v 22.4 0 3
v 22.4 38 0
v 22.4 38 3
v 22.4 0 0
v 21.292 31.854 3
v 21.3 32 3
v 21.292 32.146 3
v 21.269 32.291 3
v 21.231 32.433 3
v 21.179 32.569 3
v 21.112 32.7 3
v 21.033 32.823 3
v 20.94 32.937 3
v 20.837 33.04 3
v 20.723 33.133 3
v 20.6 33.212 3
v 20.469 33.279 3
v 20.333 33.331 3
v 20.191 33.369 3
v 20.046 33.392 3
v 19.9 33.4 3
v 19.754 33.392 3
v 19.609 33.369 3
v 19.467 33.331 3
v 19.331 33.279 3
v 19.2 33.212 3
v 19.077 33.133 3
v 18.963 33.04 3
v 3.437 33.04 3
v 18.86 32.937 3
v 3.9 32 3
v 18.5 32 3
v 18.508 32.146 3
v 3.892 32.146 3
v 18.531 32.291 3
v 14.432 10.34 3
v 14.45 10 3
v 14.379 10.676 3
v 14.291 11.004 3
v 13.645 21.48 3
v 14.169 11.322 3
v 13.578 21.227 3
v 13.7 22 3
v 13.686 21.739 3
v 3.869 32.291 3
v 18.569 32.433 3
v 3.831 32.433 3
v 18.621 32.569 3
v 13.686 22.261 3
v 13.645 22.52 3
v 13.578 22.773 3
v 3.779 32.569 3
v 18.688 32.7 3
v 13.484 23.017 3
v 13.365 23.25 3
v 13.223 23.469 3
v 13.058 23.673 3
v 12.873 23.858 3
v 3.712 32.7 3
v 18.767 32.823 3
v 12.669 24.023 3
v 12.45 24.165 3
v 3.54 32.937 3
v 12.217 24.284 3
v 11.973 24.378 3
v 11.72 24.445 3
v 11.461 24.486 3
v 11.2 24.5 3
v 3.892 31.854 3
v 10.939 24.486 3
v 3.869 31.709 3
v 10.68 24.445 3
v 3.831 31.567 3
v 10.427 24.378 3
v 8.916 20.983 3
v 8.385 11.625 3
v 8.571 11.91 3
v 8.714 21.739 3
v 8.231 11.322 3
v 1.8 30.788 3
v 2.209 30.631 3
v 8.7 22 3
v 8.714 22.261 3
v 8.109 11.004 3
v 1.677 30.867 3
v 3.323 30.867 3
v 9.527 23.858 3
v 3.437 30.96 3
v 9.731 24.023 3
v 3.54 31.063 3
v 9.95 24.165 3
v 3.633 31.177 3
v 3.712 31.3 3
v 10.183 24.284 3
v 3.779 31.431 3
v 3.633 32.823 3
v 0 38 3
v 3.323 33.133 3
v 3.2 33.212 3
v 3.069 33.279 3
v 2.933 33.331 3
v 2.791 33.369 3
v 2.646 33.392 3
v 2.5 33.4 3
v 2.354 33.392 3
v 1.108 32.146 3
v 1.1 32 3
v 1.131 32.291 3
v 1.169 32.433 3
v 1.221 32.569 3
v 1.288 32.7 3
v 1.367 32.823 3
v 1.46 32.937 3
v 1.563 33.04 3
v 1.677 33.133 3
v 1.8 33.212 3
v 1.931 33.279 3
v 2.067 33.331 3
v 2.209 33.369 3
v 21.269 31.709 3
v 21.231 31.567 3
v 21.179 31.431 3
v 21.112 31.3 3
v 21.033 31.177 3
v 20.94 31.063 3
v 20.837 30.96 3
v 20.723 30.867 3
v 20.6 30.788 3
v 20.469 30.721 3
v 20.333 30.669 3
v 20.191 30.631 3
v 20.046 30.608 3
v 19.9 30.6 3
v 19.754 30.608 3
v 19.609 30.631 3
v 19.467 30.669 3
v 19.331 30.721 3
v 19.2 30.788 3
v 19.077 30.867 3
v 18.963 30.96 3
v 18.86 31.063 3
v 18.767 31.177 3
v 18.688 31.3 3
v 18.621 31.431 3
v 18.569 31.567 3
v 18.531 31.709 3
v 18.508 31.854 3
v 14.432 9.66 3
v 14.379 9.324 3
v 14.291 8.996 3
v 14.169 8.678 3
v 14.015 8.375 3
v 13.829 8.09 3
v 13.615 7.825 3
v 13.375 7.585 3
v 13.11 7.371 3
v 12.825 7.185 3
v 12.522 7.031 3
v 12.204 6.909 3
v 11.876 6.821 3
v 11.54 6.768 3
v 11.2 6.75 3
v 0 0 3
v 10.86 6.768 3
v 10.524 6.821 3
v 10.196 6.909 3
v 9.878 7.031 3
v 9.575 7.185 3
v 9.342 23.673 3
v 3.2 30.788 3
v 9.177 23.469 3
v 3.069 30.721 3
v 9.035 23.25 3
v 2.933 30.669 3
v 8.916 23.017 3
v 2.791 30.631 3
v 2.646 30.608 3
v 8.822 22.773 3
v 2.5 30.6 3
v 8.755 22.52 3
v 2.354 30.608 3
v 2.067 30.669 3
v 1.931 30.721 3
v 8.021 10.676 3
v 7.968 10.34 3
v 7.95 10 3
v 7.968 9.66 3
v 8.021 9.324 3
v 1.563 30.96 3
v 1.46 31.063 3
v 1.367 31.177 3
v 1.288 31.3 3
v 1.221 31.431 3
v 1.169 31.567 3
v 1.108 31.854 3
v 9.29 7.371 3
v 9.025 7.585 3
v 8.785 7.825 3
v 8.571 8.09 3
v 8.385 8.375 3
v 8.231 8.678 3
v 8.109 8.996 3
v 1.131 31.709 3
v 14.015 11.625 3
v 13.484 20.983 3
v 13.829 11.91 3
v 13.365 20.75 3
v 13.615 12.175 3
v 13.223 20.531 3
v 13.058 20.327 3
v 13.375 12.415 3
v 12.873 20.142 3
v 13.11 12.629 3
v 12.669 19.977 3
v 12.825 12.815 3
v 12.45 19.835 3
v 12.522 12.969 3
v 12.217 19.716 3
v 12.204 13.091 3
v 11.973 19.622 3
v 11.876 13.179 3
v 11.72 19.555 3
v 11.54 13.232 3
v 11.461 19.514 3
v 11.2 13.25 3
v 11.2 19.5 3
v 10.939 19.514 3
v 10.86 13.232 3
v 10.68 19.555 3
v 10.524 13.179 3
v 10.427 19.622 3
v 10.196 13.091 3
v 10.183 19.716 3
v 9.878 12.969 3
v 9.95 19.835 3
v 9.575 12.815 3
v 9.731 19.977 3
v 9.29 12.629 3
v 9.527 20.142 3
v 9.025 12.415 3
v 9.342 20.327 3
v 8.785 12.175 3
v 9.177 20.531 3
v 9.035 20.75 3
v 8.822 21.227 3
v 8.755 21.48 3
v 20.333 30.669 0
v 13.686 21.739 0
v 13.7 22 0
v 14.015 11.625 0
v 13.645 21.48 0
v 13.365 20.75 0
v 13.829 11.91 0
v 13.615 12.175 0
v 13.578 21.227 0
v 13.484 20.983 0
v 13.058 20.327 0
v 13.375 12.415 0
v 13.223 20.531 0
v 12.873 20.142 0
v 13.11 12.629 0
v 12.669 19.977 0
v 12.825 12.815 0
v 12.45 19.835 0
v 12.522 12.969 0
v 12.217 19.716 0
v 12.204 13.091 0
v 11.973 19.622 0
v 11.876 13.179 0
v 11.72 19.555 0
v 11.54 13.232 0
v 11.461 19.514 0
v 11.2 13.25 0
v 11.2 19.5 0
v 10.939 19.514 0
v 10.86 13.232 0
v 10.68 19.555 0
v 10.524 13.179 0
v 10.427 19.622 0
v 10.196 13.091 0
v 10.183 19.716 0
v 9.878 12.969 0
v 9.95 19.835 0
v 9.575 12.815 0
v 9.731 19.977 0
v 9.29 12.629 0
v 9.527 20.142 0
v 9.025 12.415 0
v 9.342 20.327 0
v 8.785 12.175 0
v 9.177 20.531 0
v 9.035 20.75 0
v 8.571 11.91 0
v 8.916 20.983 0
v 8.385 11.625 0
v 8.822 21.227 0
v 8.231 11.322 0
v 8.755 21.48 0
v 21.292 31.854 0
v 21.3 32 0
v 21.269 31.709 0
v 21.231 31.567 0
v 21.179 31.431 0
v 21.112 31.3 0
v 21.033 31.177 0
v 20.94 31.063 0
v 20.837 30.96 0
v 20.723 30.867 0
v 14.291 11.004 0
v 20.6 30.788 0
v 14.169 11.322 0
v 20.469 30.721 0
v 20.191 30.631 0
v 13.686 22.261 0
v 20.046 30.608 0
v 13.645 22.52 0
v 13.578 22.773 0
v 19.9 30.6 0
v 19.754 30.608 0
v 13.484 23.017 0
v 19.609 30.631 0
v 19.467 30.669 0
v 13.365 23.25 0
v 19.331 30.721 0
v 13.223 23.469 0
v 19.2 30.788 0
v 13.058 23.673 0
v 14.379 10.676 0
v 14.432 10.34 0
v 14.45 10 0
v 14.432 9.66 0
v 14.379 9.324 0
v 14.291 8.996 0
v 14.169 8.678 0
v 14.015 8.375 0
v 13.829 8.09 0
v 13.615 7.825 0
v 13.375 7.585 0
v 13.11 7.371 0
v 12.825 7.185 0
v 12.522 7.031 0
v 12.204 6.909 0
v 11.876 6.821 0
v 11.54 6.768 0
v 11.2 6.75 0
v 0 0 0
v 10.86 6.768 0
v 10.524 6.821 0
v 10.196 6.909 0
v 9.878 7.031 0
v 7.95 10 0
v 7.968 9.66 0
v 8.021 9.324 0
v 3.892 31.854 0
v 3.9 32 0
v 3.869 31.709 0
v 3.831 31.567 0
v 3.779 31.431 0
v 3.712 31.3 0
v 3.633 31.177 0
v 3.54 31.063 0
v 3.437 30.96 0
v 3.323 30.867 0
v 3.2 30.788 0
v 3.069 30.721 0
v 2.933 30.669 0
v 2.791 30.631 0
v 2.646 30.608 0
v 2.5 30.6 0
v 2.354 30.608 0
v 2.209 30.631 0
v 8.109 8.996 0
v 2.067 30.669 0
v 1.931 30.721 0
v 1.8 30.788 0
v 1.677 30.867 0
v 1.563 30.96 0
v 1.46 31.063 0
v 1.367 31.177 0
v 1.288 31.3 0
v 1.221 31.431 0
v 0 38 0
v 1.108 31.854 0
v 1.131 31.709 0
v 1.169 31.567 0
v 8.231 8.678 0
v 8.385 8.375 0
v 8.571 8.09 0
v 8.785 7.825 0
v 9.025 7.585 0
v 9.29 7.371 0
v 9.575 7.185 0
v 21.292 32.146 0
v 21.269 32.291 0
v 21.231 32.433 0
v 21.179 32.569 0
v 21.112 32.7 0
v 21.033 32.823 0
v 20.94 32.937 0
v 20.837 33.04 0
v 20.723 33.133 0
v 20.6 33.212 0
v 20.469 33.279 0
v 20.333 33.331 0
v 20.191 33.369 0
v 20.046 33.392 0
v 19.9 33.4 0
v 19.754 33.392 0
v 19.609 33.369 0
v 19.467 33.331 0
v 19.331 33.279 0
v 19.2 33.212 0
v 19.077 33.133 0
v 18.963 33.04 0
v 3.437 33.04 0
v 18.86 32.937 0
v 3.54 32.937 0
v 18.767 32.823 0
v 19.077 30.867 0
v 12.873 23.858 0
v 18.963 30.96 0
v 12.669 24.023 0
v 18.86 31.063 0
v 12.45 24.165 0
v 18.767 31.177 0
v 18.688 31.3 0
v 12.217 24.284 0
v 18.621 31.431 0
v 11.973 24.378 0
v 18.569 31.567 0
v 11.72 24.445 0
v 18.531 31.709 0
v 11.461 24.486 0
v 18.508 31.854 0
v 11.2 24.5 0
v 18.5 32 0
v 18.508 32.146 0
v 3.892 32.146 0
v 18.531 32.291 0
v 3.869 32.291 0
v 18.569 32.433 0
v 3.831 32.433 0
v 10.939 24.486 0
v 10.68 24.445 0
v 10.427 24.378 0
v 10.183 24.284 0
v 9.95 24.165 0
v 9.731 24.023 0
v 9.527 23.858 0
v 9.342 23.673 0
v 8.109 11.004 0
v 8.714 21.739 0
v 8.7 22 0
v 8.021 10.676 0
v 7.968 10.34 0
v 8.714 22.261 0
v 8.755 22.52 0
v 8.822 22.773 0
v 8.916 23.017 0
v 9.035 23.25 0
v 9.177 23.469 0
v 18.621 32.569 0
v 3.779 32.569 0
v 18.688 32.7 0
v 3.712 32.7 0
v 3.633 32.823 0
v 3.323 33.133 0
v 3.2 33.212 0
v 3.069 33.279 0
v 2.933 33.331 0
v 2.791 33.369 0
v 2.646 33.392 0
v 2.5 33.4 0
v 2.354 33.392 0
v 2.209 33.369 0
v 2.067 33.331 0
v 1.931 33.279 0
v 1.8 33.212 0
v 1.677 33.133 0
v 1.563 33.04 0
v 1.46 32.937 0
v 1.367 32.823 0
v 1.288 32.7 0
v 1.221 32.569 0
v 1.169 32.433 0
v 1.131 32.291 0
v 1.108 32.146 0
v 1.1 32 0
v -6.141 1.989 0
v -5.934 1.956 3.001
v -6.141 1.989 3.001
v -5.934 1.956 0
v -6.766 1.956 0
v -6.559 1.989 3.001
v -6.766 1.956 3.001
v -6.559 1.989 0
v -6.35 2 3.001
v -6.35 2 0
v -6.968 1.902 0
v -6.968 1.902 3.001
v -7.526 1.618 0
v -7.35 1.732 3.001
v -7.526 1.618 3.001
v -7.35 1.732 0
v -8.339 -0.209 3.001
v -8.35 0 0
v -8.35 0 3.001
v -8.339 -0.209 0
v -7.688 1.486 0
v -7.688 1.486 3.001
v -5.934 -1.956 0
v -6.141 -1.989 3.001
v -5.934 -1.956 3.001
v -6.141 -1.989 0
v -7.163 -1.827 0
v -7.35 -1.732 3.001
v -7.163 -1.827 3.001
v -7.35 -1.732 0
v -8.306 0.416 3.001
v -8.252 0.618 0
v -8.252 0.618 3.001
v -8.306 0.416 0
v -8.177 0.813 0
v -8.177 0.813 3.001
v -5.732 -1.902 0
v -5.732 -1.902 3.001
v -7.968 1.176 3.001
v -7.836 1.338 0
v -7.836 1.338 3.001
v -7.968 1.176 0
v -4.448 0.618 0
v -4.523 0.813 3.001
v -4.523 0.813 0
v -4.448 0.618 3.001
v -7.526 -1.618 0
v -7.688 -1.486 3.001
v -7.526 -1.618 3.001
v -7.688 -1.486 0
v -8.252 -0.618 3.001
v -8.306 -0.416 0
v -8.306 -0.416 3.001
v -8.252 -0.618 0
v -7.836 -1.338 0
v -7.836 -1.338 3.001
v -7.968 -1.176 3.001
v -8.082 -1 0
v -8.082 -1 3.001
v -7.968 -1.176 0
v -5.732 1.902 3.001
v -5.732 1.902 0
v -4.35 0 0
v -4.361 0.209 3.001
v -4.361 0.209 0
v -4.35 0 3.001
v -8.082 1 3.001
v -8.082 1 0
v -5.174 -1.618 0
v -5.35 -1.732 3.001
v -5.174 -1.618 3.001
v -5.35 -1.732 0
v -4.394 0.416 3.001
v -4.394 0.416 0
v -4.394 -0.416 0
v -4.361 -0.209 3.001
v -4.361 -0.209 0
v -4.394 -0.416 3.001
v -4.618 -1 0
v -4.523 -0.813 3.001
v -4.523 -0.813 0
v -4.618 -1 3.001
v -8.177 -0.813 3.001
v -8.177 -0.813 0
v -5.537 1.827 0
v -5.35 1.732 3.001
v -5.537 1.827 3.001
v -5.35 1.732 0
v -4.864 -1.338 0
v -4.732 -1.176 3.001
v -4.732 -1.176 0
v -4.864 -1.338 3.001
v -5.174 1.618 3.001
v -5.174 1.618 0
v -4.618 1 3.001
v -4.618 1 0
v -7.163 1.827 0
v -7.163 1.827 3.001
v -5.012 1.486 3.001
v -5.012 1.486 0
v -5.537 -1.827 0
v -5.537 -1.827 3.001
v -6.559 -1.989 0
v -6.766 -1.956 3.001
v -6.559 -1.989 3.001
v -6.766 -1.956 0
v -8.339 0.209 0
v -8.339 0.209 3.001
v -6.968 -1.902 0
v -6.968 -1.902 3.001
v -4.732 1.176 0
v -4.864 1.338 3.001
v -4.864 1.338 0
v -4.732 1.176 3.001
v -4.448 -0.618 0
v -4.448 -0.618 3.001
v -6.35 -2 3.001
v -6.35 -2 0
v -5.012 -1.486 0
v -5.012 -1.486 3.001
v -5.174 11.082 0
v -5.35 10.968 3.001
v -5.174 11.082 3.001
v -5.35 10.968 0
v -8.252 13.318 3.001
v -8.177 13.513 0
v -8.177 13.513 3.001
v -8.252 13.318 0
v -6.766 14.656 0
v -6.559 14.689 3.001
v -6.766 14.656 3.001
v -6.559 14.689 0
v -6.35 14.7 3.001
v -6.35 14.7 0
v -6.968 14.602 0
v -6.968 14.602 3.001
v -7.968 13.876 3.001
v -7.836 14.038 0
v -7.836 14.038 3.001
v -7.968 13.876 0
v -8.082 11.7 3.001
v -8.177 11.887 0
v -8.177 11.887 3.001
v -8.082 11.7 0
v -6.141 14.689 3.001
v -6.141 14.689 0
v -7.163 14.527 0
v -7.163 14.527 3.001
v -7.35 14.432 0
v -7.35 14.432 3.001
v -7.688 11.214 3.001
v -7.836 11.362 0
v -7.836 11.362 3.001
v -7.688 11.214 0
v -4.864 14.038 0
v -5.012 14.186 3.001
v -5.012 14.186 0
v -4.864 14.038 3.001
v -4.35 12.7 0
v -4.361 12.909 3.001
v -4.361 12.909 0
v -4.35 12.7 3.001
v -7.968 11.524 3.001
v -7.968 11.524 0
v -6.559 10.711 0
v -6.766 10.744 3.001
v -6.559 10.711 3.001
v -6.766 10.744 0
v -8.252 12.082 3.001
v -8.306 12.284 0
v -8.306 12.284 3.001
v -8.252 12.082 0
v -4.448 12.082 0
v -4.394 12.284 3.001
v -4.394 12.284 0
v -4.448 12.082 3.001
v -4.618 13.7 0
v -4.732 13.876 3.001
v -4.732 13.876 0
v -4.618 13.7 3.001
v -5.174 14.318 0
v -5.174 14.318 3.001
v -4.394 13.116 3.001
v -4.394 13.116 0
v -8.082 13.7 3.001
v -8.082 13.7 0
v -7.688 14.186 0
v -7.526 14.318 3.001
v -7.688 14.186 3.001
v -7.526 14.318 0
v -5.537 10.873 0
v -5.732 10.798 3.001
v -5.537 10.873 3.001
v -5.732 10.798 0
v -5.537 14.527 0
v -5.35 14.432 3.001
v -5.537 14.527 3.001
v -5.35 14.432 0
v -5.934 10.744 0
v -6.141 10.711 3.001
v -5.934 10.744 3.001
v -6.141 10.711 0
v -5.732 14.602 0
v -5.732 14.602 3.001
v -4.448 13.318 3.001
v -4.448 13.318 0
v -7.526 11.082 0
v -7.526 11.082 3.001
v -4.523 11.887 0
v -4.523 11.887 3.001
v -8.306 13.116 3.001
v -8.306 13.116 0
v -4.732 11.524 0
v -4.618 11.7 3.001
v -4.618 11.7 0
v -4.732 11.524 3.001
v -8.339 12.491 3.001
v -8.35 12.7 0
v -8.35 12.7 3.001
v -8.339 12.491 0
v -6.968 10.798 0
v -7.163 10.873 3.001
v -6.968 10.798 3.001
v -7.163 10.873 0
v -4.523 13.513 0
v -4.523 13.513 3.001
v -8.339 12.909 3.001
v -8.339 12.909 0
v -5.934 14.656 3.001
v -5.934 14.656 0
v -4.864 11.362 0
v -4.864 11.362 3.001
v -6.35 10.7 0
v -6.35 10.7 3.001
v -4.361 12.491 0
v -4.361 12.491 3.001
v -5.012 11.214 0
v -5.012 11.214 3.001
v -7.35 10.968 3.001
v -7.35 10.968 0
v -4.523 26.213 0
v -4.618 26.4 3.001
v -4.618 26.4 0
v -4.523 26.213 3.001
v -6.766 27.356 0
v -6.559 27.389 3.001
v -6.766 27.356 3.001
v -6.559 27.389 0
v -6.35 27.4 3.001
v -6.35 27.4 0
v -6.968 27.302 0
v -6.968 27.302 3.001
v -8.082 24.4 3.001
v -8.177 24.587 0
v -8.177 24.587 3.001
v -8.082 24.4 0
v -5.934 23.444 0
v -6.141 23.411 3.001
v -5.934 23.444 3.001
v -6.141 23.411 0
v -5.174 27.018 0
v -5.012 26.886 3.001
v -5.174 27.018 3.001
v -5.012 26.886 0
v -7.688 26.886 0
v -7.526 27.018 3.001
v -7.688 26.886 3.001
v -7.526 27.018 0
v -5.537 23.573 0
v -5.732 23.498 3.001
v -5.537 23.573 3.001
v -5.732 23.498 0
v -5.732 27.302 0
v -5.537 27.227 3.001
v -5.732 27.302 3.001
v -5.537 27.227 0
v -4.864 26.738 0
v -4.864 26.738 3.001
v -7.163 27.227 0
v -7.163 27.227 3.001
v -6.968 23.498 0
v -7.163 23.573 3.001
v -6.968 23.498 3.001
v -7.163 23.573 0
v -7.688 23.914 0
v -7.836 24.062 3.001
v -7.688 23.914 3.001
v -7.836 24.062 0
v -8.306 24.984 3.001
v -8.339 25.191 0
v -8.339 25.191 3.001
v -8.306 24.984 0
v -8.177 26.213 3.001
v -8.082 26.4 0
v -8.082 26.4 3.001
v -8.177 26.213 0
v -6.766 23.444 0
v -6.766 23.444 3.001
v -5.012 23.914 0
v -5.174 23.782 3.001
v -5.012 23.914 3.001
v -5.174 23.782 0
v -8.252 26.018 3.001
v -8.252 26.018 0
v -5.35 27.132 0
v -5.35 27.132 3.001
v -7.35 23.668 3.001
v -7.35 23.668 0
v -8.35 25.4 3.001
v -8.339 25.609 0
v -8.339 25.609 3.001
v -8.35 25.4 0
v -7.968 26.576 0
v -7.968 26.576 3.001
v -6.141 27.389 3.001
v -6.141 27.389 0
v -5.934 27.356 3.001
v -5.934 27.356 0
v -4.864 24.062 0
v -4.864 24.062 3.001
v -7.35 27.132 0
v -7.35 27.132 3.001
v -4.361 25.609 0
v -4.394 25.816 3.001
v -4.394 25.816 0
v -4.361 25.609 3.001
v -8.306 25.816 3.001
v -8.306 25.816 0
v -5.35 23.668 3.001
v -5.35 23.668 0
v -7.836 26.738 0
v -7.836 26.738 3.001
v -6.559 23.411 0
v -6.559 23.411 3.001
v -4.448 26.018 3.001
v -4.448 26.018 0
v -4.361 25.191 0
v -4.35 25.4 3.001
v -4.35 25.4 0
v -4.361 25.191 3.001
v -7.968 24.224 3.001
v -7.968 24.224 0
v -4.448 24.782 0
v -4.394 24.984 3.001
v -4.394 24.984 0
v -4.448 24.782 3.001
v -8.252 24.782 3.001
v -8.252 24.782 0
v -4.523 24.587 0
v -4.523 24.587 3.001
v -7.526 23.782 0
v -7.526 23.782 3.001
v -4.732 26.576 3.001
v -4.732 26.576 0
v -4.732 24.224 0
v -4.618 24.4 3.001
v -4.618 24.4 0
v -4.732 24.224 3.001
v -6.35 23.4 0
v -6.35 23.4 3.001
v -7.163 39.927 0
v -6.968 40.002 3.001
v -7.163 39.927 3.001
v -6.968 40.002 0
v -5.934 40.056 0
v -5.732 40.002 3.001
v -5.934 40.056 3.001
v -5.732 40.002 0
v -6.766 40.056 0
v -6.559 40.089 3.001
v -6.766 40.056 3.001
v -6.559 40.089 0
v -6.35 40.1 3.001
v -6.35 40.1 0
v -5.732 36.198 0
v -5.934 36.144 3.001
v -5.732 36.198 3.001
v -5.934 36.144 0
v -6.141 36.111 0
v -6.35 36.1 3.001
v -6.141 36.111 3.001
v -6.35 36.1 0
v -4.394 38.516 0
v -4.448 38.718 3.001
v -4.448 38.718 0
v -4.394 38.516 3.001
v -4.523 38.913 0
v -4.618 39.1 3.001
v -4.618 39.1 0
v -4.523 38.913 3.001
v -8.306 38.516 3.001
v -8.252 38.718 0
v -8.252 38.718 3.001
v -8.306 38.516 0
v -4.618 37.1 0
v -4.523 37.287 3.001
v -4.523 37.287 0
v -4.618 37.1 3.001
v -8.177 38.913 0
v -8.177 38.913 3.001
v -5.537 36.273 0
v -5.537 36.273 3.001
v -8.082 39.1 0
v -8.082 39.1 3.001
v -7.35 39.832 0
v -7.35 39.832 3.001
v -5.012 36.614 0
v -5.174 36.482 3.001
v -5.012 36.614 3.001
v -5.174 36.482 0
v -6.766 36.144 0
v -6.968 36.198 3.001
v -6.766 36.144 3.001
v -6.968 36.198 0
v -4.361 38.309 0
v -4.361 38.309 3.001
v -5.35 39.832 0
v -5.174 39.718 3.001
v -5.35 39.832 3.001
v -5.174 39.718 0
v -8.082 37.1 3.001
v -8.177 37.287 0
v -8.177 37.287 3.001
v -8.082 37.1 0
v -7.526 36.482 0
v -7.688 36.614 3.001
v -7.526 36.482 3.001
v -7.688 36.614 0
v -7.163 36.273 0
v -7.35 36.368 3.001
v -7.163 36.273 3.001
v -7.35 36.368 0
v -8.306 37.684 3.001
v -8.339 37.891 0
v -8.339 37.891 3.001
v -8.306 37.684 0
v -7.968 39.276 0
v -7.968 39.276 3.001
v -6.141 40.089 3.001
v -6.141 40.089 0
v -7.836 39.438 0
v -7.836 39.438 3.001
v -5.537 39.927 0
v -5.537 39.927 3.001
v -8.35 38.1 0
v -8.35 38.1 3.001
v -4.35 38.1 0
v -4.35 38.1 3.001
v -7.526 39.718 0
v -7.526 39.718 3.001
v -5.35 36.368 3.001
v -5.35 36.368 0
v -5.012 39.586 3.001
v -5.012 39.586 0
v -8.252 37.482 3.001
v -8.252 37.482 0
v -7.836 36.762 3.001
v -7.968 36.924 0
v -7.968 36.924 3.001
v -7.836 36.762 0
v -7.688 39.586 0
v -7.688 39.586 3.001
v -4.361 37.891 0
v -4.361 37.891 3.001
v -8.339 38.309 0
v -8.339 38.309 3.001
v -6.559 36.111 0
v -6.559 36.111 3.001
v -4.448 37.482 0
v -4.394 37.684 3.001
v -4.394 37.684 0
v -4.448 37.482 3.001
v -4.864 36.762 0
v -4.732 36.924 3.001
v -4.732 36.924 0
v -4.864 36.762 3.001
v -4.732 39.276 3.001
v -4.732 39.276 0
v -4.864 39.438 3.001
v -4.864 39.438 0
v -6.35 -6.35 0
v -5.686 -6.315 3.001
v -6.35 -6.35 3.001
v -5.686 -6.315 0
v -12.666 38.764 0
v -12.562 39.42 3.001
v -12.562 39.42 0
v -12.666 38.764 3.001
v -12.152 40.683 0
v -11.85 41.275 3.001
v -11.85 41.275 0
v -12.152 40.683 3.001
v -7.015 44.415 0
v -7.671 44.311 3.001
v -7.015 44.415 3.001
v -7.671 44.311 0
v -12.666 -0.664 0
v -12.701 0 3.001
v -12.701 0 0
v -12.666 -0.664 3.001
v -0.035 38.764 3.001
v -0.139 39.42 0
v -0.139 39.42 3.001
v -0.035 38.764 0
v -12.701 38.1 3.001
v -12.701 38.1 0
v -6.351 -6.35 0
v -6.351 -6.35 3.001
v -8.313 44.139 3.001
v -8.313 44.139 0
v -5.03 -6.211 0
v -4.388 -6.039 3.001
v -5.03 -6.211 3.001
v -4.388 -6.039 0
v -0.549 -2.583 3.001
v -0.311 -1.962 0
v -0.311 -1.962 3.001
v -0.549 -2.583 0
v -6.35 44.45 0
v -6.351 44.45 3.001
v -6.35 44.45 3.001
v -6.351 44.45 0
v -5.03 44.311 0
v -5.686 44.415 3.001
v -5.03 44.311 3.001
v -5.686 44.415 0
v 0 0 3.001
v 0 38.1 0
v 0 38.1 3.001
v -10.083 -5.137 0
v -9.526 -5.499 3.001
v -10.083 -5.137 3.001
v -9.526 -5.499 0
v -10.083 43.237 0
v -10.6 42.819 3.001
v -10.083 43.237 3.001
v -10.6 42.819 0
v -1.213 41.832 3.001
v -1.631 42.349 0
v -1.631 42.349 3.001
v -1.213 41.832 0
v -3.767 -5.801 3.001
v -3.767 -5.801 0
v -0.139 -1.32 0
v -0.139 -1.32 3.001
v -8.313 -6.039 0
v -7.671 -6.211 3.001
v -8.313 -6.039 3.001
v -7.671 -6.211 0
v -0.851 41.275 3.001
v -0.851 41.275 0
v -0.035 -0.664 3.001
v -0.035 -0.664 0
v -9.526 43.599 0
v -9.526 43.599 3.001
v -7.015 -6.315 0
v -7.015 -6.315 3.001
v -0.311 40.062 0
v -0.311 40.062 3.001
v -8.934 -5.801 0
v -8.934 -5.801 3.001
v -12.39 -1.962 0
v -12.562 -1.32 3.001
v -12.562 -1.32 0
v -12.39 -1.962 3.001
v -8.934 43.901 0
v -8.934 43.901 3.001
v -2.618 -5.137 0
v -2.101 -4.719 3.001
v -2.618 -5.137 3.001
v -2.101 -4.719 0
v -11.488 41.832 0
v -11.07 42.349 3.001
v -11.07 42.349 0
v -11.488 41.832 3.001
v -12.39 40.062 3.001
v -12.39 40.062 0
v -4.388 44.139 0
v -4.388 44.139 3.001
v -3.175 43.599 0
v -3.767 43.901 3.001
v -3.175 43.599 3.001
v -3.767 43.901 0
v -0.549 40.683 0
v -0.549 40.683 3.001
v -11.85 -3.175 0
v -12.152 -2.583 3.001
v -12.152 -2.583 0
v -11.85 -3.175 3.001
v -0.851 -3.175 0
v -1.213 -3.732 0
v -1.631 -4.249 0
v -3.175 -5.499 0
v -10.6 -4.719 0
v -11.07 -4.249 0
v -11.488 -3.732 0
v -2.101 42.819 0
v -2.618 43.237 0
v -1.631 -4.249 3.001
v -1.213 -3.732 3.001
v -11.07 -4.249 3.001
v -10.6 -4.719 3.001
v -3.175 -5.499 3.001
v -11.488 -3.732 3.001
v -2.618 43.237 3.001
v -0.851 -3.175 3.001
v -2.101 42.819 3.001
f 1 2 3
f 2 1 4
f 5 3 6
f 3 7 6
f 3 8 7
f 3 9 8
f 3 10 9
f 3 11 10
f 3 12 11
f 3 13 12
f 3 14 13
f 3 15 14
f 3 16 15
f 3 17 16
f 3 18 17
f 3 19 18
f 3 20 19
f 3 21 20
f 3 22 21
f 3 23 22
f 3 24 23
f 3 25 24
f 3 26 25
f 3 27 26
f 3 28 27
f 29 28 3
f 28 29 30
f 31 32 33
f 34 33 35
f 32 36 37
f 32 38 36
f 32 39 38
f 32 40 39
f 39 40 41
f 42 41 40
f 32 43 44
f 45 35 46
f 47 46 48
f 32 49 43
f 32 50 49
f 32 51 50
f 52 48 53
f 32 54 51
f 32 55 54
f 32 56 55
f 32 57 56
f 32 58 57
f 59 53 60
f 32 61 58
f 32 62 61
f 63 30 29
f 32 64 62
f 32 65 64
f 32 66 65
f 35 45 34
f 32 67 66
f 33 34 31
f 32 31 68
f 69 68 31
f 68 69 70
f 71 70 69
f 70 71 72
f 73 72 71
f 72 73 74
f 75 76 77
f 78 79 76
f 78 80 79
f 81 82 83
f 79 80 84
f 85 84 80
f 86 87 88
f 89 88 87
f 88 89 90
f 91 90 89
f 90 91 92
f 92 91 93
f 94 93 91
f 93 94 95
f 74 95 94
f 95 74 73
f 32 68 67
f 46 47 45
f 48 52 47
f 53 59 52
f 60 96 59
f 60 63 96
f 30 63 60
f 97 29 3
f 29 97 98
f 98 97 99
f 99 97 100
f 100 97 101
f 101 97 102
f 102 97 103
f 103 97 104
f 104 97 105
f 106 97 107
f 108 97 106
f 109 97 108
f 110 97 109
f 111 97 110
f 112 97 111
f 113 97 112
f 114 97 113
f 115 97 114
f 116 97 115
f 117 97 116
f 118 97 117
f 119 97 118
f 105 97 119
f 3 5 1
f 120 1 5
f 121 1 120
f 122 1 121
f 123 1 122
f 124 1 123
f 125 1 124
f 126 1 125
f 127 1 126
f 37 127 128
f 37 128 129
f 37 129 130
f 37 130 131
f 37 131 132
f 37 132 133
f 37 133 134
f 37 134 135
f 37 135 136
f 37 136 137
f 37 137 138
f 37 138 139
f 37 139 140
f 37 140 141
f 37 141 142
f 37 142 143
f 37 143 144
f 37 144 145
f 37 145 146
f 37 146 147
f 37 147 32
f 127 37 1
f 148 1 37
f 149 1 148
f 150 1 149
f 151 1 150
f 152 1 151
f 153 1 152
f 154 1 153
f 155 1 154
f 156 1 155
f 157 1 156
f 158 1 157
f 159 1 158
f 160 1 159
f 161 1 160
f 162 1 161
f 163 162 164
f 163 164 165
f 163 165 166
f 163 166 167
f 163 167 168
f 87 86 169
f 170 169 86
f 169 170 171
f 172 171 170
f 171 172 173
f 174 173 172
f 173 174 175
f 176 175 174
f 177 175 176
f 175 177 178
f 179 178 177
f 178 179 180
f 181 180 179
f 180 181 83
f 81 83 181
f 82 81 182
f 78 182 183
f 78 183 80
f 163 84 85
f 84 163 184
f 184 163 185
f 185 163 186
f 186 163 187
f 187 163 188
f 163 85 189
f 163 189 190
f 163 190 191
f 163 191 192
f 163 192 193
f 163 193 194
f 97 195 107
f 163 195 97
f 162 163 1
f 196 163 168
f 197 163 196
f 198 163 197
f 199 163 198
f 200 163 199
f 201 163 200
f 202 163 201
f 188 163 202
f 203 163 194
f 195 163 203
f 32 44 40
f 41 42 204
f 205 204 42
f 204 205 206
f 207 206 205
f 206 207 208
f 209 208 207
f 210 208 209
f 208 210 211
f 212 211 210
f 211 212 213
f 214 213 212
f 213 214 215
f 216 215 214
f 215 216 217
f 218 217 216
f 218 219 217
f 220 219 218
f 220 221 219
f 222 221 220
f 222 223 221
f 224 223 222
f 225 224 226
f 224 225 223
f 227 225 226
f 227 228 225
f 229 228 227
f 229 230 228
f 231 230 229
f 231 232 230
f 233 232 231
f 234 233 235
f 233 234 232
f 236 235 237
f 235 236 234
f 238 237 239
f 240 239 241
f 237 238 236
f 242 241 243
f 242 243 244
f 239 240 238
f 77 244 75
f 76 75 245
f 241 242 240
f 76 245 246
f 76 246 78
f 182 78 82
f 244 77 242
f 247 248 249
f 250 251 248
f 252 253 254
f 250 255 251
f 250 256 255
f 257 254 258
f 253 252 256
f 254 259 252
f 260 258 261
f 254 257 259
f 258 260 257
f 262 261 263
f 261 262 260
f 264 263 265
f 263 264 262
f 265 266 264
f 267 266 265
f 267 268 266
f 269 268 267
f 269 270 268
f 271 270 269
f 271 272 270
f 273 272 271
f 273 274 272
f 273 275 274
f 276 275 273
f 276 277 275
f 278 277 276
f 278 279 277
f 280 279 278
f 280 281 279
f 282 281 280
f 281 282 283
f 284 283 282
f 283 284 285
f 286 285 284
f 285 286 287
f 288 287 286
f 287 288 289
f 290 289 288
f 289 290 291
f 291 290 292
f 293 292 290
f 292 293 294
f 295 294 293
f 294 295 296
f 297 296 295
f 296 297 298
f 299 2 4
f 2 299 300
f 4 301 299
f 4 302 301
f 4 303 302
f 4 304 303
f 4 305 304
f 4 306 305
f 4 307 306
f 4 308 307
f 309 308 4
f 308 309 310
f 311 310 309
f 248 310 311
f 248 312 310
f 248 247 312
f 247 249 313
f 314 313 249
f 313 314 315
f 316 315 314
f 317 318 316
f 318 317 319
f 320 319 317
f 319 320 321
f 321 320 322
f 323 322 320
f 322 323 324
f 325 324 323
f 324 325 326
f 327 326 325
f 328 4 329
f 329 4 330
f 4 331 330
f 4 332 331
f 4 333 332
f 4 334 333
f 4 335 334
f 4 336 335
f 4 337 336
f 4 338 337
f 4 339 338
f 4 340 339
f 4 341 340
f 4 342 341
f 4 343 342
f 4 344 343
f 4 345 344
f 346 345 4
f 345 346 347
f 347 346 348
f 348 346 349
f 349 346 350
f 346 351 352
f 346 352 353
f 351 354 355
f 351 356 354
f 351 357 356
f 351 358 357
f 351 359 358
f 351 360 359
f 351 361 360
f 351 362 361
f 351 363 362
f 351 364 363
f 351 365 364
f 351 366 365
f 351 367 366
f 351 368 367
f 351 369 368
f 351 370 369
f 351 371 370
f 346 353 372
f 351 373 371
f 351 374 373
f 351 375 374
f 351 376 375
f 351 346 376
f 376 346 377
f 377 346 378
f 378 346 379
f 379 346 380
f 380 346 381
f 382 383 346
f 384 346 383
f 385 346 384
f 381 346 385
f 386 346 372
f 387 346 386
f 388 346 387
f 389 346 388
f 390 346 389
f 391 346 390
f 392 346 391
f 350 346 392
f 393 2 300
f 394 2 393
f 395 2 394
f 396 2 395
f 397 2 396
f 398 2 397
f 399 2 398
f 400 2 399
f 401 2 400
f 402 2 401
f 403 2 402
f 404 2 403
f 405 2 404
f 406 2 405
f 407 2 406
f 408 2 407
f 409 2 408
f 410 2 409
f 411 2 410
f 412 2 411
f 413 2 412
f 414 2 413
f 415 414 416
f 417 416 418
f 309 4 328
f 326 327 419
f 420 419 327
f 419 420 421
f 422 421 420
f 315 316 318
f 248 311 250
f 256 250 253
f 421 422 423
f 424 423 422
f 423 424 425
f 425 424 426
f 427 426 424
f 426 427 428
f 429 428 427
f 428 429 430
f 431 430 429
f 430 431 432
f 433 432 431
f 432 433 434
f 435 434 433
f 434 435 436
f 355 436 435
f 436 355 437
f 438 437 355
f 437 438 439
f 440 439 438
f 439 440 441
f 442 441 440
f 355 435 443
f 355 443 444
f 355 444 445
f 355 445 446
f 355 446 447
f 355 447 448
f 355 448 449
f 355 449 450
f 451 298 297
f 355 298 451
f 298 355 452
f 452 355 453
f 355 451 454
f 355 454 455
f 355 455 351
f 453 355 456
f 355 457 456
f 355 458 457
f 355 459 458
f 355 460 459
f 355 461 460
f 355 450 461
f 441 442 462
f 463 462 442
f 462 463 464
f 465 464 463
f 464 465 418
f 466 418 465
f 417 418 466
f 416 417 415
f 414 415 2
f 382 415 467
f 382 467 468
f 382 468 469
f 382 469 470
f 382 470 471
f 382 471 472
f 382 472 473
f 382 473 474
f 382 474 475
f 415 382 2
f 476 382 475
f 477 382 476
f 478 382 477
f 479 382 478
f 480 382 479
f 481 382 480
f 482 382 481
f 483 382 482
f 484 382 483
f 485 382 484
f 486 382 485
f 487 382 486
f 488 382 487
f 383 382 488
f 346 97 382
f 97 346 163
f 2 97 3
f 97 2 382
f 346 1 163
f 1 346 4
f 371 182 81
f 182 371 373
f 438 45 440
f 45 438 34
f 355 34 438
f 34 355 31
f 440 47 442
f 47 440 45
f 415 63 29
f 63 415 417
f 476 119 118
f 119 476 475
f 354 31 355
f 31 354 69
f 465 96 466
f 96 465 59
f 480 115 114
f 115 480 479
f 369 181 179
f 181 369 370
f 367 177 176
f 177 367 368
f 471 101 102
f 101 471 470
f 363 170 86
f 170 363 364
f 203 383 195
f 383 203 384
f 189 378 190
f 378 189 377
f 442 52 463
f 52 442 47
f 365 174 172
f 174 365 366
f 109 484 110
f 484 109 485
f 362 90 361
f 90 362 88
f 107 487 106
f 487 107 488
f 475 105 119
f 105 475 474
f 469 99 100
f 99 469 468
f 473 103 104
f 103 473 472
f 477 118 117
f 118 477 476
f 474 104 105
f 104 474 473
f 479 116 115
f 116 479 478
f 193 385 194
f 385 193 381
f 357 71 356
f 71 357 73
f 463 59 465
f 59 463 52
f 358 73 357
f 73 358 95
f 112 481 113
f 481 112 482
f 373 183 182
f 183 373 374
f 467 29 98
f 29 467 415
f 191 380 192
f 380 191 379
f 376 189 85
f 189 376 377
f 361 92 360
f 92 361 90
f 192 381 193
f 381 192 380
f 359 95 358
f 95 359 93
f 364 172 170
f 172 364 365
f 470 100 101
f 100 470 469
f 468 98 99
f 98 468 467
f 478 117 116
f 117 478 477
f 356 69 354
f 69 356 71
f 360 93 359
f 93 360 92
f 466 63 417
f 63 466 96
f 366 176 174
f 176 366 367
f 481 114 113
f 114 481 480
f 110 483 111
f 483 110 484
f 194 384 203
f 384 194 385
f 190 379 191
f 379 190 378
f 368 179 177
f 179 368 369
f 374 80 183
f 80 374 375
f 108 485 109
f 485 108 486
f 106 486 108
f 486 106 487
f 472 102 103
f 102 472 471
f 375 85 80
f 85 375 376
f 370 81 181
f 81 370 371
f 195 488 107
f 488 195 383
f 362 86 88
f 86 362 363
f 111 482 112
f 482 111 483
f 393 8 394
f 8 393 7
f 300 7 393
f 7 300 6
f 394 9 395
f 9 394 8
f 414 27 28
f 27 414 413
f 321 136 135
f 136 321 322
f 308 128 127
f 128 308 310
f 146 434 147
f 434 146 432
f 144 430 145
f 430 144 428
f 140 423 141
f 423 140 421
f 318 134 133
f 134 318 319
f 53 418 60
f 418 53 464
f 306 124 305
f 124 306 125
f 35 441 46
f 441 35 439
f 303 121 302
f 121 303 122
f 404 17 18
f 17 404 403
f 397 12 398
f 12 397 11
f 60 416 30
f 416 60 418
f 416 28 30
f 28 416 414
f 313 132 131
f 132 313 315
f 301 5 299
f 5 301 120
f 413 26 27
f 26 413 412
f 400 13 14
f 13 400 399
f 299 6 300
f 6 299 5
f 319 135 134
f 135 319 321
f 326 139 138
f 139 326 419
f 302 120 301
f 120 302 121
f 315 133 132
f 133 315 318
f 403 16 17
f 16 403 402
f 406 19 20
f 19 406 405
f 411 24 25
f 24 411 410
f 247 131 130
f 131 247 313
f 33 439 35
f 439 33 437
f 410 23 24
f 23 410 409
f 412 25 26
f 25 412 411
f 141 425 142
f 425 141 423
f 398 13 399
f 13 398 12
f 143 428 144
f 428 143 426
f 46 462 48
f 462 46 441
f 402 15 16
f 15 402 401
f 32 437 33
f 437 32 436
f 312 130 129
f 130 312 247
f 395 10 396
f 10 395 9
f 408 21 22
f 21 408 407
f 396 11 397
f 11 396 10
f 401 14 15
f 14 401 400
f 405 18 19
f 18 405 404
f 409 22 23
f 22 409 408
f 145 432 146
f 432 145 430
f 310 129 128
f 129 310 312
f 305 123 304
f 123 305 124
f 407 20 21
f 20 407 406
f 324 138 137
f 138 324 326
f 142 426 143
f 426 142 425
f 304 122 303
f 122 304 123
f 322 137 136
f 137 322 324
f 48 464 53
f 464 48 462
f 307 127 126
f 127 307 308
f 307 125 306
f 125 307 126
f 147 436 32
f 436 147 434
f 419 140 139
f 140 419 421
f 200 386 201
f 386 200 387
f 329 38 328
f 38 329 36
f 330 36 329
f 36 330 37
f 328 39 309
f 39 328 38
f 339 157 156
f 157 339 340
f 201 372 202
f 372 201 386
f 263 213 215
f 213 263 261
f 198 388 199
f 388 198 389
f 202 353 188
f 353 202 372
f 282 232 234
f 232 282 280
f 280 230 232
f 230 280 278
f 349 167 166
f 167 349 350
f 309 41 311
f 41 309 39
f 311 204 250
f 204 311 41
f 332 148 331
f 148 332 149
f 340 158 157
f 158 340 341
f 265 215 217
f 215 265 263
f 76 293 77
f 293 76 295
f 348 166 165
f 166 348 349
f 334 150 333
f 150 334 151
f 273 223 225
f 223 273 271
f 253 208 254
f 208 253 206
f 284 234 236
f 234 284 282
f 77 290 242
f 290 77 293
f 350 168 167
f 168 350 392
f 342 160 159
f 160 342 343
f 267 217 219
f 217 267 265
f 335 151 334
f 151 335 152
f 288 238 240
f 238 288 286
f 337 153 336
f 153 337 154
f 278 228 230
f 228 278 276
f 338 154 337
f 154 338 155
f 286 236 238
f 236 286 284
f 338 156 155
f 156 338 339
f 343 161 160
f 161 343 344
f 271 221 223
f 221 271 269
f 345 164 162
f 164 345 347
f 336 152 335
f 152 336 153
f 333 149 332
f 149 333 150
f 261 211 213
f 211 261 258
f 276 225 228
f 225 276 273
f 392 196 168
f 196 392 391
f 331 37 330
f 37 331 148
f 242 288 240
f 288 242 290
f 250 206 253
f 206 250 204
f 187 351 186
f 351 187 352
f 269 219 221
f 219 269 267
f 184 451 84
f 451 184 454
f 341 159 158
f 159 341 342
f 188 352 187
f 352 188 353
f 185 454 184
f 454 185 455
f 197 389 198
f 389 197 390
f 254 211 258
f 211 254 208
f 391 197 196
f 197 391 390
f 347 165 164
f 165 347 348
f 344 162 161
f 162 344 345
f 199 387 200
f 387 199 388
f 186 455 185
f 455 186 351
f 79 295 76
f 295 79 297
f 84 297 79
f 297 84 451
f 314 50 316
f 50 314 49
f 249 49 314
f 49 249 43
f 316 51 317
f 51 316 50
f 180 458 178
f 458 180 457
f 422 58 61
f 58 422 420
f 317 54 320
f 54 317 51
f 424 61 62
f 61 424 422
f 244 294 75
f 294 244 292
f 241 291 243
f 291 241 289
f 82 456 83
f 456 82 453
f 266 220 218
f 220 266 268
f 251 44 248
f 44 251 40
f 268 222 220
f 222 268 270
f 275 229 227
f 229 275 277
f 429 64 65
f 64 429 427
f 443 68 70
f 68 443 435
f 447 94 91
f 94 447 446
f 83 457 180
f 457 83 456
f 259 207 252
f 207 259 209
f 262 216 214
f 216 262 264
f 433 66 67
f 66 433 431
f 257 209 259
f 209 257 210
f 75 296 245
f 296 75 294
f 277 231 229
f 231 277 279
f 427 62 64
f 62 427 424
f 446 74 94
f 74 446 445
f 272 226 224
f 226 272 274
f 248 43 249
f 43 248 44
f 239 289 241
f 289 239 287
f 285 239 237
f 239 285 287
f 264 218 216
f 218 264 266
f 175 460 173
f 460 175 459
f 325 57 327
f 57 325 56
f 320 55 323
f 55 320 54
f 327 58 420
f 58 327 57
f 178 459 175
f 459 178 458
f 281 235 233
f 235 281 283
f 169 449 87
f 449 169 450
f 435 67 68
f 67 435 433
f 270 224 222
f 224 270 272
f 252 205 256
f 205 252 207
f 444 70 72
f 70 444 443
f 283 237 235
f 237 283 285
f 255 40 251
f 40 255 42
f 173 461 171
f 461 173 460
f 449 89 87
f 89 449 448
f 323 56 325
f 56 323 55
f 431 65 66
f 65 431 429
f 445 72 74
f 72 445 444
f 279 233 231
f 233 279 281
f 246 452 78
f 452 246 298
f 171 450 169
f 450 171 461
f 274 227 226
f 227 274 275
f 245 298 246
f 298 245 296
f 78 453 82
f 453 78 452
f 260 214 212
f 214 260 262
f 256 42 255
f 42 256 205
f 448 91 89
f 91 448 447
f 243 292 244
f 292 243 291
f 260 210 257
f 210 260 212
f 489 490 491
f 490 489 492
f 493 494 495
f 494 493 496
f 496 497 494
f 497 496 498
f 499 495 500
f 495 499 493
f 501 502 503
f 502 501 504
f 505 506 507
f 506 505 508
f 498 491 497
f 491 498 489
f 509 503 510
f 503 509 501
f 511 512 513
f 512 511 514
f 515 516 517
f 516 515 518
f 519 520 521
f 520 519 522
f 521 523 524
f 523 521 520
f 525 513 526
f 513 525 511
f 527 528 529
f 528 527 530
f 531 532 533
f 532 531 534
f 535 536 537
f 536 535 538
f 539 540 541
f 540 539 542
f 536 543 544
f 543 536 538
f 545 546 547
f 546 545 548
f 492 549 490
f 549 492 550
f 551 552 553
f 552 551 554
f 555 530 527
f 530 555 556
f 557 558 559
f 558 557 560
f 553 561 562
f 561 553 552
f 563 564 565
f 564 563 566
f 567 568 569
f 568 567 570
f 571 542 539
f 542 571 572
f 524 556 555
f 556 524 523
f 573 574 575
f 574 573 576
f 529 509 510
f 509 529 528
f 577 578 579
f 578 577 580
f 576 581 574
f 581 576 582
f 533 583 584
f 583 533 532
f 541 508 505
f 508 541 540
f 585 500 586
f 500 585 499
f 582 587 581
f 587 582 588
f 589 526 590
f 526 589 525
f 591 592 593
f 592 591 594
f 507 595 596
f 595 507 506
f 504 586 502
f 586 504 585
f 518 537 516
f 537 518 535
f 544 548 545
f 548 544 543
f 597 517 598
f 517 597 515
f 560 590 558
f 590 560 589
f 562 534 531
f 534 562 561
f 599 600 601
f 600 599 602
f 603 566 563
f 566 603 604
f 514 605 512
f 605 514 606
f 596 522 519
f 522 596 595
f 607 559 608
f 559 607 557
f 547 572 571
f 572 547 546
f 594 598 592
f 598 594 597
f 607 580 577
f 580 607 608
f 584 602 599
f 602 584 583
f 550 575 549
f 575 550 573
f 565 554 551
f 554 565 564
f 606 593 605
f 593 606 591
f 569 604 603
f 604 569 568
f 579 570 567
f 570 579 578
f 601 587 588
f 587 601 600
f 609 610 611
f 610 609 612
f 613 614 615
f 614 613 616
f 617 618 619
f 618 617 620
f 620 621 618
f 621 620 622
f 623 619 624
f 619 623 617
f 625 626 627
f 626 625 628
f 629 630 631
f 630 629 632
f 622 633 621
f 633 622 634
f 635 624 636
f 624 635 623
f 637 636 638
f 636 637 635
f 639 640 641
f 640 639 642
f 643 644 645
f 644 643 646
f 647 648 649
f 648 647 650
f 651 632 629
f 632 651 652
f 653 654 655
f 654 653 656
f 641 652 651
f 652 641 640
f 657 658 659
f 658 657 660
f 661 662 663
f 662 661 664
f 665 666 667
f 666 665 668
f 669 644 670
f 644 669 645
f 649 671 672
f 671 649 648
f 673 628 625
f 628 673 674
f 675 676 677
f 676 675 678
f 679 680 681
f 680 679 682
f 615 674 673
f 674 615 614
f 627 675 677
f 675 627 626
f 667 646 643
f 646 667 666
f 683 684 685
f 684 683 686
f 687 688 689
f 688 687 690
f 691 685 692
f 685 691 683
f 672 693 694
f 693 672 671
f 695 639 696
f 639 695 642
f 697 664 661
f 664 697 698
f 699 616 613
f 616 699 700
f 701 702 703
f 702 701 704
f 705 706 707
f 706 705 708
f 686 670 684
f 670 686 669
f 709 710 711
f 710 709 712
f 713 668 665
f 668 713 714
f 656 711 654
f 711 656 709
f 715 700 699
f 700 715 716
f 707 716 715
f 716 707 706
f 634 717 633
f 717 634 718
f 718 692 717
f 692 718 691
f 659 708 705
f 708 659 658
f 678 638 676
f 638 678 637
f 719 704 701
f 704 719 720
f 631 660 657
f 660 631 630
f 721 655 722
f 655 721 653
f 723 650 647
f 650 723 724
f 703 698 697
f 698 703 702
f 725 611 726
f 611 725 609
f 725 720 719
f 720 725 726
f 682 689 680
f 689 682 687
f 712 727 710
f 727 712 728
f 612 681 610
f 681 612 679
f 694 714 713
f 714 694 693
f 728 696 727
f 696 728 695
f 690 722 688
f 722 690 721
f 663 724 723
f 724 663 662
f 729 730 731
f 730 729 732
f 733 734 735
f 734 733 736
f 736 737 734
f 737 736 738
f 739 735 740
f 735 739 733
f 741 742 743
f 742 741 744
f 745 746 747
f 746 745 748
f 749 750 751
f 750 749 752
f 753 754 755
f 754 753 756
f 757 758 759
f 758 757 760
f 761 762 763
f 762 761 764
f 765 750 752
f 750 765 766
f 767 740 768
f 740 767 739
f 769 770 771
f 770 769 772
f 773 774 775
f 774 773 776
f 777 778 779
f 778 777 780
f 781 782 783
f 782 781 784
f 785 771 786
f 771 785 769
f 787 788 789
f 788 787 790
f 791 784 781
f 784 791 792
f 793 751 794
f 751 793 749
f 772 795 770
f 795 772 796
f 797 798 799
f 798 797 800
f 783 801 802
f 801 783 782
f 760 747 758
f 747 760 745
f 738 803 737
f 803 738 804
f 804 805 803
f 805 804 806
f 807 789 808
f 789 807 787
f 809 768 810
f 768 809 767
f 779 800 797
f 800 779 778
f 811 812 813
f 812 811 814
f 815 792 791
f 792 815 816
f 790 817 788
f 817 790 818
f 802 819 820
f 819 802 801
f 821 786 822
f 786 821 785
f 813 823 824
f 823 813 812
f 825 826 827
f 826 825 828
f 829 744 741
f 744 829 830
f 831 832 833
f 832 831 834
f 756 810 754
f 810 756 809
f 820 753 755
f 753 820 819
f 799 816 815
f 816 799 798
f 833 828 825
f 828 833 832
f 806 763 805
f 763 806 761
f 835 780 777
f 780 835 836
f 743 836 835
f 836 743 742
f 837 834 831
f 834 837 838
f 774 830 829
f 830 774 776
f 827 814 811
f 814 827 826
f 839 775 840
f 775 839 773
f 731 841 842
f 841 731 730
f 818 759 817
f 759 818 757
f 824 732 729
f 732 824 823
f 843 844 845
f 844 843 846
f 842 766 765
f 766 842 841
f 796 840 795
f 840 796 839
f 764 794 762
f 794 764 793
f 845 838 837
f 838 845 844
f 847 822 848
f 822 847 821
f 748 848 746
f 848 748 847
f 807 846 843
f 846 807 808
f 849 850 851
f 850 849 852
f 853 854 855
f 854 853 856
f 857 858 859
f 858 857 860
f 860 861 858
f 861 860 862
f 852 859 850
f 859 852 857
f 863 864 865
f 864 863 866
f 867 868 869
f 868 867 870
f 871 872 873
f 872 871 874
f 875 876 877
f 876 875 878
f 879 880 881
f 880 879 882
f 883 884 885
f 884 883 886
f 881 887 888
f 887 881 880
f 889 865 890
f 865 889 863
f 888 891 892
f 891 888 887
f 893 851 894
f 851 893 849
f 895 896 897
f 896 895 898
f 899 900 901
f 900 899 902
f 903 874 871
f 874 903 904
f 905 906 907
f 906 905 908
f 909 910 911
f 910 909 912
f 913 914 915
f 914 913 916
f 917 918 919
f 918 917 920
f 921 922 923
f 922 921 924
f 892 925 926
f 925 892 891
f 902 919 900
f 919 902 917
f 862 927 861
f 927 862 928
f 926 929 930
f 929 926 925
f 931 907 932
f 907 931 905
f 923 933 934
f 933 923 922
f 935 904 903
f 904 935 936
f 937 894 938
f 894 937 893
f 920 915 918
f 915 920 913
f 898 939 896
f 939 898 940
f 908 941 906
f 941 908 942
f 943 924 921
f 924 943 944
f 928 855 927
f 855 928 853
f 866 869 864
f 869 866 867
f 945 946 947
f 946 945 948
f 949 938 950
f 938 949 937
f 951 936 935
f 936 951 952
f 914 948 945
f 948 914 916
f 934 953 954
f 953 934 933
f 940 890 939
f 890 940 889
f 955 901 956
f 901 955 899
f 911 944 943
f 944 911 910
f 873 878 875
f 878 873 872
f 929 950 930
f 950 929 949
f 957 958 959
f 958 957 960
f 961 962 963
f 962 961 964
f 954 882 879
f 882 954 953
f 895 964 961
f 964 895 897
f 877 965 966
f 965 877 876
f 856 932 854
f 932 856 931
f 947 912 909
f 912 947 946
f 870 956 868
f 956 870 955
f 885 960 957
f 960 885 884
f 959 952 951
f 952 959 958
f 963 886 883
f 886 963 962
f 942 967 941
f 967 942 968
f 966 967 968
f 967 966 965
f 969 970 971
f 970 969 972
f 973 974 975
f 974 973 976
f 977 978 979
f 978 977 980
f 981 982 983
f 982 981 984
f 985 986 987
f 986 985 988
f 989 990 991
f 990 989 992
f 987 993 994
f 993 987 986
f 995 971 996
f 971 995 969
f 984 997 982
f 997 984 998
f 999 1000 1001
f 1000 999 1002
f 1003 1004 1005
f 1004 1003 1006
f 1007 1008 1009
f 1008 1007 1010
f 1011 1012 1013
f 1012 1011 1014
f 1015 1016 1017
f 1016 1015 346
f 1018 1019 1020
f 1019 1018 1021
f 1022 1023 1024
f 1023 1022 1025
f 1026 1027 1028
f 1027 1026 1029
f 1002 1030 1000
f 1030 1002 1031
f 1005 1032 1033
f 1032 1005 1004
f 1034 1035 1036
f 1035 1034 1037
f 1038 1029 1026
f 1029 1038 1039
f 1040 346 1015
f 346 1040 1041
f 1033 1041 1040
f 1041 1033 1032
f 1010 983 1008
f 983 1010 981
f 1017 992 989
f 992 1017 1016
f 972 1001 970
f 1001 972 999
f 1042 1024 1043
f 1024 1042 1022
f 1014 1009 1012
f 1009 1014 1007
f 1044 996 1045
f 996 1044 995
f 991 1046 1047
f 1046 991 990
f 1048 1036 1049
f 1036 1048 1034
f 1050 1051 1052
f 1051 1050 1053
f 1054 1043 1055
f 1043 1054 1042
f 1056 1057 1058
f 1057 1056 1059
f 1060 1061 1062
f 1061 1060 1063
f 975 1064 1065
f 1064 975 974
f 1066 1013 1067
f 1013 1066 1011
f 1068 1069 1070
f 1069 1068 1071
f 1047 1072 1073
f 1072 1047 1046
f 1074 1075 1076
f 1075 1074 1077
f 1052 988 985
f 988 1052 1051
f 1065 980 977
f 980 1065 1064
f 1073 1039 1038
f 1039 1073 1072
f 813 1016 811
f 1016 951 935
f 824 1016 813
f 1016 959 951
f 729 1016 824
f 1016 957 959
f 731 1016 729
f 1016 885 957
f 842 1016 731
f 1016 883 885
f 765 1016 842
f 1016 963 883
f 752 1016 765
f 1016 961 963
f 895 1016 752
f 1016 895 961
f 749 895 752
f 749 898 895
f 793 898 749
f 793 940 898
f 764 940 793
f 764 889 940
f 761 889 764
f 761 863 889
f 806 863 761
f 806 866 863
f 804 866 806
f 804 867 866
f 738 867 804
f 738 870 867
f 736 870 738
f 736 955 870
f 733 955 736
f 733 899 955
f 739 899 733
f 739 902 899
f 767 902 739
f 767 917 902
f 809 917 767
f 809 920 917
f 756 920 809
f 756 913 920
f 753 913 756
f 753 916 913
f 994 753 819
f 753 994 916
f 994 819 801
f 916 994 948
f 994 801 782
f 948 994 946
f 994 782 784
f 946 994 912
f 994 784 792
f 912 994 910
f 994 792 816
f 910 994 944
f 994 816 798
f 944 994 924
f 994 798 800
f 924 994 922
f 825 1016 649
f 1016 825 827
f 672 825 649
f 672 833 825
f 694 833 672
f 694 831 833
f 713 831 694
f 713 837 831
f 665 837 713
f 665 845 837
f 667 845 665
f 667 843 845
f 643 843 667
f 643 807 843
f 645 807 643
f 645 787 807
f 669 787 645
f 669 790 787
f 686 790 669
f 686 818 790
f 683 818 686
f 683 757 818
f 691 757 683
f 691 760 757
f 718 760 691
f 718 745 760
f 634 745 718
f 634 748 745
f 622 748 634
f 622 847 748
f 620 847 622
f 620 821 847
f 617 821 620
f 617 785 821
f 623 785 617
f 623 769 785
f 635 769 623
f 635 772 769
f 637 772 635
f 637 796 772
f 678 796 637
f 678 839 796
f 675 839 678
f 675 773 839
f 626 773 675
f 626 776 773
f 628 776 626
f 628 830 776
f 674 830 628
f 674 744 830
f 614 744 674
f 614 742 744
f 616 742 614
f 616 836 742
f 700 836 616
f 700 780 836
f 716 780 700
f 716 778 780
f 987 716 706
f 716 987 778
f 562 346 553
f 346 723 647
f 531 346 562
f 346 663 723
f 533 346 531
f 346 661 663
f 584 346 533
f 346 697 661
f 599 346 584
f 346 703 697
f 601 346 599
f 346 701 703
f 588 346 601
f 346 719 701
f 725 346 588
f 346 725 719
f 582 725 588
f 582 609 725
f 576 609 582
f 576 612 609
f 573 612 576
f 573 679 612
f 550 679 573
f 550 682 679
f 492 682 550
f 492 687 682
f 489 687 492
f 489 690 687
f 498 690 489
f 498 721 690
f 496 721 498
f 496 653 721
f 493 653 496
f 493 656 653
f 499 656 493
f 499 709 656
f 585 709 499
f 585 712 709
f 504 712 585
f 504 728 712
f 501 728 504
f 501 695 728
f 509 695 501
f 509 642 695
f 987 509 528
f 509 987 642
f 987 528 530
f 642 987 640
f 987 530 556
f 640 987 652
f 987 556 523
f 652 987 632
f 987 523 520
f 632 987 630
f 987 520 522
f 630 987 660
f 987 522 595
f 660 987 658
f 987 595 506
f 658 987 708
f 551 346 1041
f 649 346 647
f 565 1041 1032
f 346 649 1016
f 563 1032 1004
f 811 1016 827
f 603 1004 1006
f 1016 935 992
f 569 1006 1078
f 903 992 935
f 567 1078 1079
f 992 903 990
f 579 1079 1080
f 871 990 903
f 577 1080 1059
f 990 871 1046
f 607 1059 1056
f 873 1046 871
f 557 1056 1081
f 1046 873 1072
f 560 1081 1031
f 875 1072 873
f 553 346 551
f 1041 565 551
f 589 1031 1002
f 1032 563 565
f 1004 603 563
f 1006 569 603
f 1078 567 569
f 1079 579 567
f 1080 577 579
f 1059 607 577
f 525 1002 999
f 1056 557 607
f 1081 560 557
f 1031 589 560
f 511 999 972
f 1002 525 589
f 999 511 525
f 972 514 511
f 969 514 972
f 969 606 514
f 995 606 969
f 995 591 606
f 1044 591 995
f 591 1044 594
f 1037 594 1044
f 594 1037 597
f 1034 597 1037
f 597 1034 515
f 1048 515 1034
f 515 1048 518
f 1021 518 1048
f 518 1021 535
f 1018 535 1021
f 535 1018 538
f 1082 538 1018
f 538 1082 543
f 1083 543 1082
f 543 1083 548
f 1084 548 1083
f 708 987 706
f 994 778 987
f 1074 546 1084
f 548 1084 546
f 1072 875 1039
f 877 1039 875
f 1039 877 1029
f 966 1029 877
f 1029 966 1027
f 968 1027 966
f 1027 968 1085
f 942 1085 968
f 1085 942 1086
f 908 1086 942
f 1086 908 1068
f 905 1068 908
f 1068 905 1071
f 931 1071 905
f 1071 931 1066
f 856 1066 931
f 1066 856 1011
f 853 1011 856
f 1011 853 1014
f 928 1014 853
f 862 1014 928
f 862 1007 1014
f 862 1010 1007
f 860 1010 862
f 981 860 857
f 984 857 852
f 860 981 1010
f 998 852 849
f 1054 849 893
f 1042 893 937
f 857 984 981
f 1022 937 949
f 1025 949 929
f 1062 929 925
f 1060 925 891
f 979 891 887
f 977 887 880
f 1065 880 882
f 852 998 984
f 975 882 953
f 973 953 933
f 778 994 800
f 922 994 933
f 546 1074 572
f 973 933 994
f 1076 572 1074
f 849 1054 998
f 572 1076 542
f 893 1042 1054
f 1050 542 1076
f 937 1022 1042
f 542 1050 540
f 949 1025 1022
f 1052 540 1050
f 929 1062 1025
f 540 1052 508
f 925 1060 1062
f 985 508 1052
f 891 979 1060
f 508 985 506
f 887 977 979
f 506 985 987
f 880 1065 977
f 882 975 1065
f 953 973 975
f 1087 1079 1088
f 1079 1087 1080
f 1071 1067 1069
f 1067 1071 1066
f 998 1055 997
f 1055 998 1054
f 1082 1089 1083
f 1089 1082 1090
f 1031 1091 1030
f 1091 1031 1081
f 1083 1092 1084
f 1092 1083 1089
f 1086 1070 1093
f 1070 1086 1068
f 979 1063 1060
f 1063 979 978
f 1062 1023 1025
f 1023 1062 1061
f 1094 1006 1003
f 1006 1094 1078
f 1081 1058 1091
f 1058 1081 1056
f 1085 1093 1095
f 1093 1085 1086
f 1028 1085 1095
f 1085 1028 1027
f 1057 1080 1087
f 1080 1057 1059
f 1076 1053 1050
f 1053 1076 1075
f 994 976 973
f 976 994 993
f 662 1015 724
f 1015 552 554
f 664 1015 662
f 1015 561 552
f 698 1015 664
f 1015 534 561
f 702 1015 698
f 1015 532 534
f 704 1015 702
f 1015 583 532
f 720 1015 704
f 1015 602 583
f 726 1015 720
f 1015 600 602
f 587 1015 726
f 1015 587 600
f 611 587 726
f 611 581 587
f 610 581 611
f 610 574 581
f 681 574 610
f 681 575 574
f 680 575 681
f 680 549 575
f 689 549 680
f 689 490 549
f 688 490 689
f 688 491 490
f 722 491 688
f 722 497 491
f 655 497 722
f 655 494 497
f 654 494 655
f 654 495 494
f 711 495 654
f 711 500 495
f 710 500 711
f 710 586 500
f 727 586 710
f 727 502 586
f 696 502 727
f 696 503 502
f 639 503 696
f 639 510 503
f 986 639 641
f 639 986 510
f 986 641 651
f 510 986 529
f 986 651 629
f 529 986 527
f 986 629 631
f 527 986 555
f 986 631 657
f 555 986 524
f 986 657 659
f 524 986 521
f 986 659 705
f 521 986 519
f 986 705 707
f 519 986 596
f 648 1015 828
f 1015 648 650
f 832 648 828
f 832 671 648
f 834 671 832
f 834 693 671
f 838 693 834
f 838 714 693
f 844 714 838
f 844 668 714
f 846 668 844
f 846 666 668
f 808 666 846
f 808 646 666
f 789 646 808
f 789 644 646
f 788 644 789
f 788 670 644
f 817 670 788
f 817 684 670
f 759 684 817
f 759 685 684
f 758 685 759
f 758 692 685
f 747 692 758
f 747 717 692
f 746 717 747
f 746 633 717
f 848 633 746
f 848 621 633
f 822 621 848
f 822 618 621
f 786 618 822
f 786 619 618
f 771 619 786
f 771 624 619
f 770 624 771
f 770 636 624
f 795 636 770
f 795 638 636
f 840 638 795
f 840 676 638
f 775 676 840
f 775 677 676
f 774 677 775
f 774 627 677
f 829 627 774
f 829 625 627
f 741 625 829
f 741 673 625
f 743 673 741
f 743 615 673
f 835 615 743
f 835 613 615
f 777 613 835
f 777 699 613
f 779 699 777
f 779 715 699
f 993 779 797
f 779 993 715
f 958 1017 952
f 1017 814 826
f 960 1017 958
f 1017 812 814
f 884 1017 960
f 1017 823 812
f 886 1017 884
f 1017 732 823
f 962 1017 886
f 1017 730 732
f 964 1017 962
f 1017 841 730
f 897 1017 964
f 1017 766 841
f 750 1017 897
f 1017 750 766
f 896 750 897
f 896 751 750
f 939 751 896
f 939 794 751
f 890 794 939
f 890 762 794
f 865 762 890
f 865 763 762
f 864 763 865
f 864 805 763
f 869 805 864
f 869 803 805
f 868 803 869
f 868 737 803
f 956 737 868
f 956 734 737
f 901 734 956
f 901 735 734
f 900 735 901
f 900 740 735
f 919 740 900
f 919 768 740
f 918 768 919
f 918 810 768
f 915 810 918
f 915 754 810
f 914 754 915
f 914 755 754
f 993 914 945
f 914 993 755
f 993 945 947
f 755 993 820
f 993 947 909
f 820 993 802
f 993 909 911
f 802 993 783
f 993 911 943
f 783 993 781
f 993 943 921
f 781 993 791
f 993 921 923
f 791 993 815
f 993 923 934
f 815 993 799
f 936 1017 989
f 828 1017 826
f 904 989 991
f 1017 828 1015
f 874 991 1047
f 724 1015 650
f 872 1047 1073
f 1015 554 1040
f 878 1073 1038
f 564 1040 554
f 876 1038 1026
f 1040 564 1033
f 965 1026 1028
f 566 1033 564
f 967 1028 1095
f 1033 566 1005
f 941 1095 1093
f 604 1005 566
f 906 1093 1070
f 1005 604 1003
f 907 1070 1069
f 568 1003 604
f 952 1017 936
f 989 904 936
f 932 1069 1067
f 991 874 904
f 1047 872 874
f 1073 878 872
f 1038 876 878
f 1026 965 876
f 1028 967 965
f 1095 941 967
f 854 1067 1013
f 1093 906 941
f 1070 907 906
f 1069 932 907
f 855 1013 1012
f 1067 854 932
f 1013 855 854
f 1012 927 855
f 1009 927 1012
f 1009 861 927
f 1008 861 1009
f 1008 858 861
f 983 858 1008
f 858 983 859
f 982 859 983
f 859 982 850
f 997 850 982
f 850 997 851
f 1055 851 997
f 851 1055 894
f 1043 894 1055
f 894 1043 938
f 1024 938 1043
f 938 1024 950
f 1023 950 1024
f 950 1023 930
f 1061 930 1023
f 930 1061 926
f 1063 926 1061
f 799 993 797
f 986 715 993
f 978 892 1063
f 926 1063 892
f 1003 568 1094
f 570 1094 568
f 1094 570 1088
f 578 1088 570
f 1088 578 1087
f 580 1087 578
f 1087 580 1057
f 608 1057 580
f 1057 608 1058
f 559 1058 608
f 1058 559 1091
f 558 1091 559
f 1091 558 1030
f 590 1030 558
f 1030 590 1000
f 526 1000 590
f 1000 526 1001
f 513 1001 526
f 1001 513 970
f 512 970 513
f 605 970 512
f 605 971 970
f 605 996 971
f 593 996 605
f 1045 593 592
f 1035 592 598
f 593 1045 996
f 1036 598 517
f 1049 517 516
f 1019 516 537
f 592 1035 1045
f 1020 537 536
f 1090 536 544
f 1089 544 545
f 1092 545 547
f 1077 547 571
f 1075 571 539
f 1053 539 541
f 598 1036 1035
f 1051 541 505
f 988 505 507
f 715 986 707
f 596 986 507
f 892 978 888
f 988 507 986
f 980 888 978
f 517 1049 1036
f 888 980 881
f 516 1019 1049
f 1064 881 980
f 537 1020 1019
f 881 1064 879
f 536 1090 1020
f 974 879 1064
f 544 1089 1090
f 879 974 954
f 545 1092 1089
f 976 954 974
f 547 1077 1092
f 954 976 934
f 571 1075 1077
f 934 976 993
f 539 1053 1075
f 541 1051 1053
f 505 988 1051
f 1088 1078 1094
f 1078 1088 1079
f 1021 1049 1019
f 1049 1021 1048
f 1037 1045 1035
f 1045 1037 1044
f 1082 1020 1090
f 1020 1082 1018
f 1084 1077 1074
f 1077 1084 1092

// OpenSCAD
$fn=60;

difference(){
    cube([22.4,38,3]);
translate([2.5,32,-1])cylinder(d=2.8,h=5);
translate([19.9,32,-1])cylinder(d=2.8,h=5);
translate([11.2,10,-1])cylinder(d=6.5,h=5);    
translate([11.2,22,-1])cylinder(d=5,h=5); }


translate([-6.35,0,0])rotate([0,0,90])
meccano(n=4);
//translate([19.4,13,6.35])rotate([90,0,90])
//meccano(n=4);


module meccano(n=2){
difference(){
    minkowski(){
        cylinder(d=12.7,h=3);
        cube([(n-1)*12.7,.001,0.001]);
    }
    for (i=[0:n-1]){
        translate([i*12.7,0,-1])cylinder(d=4,h=5);
    }
}
}
